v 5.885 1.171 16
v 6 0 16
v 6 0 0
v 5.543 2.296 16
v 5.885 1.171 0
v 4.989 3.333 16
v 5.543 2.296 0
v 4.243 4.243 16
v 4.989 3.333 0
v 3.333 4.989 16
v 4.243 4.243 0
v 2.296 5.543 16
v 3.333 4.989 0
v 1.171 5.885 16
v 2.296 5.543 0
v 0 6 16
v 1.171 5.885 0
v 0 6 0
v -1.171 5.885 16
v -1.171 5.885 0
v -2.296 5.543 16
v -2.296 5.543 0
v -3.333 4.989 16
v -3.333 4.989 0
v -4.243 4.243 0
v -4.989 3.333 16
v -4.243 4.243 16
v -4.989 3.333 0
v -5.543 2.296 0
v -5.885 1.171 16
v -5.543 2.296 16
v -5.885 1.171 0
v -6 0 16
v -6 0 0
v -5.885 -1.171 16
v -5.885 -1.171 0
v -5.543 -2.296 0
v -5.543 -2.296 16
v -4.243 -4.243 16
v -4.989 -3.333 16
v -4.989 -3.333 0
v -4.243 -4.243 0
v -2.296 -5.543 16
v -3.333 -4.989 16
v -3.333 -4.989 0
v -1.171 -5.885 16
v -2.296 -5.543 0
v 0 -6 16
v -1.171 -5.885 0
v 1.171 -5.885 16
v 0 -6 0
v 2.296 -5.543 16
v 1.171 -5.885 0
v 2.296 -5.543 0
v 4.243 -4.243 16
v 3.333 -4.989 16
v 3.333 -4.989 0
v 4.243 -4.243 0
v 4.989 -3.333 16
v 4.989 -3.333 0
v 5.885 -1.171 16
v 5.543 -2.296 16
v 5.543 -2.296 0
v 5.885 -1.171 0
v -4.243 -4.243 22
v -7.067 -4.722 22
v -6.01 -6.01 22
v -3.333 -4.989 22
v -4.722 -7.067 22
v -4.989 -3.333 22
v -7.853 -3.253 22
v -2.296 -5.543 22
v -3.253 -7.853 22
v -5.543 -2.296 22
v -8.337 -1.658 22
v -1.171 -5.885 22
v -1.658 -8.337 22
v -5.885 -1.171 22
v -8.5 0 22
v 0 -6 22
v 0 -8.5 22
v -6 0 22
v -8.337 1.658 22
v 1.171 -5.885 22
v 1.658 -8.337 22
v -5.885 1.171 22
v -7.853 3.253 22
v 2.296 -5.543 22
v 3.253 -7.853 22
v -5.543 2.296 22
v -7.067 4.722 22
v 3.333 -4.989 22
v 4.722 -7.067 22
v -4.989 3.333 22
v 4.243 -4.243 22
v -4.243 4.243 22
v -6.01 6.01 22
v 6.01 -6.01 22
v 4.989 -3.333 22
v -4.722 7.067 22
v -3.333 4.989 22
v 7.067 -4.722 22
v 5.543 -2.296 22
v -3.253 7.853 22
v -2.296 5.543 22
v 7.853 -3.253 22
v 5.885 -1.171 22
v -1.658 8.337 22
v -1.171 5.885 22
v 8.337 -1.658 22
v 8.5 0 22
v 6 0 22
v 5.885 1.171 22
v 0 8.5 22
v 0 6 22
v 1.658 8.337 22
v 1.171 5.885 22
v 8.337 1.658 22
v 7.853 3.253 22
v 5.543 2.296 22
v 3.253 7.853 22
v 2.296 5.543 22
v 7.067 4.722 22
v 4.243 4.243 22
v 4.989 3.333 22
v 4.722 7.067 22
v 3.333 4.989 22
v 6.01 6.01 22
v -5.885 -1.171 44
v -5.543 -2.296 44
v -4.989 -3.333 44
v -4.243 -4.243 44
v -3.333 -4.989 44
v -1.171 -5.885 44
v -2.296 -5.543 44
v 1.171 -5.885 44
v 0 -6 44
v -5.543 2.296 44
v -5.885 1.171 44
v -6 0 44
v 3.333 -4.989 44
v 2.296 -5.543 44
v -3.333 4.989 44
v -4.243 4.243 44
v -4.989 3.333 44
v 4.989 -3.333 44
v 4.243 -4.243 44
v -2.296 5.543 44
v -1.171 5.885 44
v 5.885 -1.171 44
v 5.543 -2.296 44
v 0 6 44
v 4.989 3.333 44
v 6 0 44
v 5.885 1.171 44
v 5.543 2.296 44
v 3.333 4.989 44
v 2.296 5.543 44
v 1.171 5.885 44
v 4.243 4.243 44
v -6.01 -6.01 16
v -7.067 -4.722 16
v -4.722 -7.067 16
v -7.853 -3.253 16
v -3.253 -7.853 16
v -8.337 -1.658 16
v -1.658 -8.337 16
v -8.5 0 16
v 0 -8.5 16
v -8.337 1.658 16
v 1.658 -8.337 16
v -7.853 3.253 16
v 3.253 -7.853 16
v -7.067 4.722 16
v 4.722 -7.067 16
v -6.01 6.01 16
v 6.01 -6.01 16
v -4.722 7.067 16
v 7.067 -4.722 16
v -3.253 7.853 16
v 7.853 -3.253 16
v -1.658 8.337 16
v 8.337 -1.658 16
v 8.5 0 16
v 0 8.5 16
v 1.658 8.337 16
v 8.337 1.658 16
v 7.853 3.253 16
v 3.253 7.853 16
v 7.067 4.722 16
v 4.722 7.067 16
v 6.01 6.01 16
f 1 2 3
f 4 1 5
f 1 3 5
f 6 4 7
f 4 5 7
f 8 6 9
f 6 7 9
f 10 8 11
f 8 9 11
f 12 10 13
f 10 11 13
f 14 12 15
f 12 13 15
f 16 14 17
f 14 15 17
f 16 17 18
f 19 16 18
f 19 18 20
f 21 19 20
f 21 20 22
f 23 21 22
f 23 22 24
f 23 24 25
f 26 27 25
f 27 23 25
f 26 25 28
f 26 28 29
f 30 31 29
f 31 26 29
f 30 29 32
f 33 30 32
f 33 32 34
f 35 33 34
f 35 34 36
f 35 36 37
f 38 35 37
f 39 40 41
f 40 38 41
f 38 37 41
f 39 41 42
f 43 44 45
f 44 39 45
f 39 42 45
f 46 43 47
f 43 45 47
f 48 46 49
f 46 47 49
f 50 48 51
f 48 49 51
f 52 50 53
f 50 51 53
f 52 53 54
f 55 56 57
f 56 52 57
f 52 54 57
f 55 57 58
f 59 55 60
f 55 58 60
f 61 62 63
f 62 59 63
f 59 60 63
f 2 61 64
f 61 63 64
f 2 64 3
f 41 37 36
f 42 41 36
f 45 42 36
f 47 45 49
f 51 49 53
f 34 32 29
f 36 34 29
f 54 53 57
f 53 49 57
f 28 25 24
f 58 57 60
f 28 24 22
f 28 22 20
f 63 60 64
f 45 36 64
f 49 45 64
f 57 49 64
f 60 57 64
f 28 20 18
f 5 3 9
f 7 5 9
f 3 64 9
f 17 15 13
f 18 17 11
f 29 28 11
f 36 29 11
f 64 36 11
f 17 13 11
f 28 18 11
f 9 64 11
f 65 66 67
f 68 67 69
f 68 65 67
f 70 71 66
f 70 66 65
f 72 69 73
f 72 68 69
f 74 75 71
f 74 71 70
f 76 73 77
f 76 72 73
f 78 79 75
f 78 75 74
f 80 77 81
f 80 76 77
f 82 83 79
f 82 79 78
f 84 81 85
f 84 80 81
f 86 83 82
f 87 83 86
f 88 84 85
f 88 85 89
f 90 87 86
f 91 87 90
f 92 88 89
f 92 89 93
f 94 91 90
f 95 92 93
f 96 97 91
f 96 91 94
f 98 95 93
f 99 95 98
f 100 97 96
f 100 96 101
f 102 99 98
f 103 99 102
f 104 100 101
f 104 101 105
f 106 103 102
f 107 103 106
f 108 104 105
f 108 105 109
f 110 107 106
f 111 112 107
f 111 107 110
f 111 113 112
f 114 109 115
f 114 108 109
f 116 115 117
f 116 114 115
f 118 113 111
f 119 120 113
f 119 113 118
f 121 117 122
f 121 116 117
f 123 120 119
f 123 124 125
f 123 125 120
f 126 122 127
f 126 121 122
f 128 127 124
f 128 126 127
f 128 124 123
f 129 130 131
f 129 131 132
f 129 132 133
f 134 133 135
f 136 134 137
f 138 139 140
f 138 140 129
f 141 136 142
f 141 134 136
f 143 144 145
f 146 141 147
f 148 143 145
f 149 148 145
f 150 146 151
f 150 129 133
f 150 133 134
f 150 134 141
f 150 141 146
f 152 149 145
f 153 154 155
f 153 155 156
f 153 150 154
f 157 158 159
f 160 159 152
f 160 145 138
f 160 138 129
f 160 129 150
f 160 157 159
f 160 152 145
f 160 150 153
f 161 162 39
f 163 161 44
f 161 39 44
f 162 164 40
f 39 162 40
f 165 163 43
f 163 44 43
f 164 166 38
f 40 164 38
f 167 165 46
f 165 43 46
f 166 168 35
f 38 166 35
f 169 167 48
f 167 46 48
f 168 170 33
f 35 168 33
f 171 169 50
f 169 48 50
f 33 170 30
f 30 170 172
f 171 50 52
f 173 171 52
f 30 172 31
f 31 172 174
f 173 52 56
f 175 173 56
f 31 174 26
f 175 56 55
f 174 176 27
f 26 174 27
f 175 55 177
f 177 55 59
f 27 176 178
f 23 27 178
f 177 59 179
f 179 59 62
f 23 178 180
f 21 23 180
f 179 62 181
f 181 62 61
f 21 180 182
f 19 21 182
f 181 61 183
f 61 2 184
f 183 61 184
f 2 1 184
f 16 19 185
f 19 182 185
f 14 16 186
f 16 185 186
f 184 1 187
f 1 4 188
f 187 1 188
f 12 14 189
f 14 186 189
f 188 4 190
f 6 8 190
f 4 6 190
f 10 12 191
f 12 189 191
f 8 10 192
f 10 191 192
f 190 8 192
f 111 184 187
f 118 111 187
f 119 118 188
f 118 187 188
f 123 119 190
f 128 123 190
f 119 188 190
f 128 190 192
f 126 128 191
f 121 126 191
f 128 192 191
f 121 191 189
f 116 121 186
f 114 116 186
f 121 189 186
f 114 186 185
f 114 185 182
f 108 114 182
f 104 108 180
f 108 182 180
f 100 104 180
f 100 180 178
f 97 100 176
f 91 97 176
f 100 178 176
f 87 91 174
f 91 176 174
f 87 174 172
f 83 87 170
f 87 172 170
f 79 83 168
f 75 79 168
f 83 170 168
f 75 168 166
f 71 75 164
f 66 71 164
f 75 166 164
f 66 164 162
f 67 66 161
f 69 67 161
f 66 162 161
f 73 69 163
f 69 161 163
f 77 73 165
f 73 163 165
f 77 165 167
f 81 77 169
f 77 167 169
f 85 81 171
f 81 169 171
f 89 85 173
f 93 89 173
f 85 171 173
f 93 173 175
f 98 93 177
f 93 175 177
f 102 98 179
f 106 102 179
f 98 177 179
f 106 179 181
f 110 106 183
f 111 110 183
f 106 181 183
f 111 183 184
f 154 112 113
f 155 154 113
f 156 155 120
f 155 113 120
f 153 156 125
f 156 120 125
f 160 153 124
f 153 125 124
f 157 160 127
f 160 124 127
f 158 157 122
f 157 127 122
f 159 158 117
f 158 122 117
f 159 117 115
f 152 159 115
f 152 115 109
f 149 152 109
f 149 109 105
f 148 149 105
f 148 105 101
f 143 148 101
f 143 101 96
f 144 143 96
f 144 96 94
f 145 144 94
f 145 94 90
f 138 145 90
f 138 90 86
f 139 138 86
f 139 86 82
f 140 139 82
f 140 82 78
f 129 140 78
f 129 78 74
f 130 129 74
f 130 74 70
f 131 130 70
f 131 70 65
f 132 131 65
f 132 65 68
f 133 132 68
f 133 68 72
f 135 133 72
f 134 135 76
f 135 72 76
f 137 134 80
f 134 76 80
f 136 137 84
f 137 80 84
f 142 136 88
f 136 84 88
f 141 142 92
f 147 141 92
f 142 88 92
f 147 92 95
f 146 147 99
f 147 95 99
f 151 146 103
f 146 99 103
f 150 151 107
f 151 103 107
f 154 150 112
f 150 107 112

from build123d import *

# Parameters (mm, degrees)
SKETCH_1_R      = 6
EXTRUDE_1_DEPTH = 44
EXTRUDE_START   = 16
SKETCH_2_R      = 8.5
EXTRUDE_2_DEPTH = 6


with BuildPart() as part:
    # 草图1 → 凸台-拉伸1 (new body)
    with BuildSketch(Plane.XY):
        Circle(SKETCH_1_R)
    extrude(amount=EXTRUDE_1_DEPTH)

    # 草图2 → 凸台-拉伸2 (add)
    with BuildSketch(Plane.XY.offset(EXTRUDE_START)):
        Circle(SKETCH_2_R)
    extrude(amount=EXTRUDE_2_DEPTH)


solid = part.part
